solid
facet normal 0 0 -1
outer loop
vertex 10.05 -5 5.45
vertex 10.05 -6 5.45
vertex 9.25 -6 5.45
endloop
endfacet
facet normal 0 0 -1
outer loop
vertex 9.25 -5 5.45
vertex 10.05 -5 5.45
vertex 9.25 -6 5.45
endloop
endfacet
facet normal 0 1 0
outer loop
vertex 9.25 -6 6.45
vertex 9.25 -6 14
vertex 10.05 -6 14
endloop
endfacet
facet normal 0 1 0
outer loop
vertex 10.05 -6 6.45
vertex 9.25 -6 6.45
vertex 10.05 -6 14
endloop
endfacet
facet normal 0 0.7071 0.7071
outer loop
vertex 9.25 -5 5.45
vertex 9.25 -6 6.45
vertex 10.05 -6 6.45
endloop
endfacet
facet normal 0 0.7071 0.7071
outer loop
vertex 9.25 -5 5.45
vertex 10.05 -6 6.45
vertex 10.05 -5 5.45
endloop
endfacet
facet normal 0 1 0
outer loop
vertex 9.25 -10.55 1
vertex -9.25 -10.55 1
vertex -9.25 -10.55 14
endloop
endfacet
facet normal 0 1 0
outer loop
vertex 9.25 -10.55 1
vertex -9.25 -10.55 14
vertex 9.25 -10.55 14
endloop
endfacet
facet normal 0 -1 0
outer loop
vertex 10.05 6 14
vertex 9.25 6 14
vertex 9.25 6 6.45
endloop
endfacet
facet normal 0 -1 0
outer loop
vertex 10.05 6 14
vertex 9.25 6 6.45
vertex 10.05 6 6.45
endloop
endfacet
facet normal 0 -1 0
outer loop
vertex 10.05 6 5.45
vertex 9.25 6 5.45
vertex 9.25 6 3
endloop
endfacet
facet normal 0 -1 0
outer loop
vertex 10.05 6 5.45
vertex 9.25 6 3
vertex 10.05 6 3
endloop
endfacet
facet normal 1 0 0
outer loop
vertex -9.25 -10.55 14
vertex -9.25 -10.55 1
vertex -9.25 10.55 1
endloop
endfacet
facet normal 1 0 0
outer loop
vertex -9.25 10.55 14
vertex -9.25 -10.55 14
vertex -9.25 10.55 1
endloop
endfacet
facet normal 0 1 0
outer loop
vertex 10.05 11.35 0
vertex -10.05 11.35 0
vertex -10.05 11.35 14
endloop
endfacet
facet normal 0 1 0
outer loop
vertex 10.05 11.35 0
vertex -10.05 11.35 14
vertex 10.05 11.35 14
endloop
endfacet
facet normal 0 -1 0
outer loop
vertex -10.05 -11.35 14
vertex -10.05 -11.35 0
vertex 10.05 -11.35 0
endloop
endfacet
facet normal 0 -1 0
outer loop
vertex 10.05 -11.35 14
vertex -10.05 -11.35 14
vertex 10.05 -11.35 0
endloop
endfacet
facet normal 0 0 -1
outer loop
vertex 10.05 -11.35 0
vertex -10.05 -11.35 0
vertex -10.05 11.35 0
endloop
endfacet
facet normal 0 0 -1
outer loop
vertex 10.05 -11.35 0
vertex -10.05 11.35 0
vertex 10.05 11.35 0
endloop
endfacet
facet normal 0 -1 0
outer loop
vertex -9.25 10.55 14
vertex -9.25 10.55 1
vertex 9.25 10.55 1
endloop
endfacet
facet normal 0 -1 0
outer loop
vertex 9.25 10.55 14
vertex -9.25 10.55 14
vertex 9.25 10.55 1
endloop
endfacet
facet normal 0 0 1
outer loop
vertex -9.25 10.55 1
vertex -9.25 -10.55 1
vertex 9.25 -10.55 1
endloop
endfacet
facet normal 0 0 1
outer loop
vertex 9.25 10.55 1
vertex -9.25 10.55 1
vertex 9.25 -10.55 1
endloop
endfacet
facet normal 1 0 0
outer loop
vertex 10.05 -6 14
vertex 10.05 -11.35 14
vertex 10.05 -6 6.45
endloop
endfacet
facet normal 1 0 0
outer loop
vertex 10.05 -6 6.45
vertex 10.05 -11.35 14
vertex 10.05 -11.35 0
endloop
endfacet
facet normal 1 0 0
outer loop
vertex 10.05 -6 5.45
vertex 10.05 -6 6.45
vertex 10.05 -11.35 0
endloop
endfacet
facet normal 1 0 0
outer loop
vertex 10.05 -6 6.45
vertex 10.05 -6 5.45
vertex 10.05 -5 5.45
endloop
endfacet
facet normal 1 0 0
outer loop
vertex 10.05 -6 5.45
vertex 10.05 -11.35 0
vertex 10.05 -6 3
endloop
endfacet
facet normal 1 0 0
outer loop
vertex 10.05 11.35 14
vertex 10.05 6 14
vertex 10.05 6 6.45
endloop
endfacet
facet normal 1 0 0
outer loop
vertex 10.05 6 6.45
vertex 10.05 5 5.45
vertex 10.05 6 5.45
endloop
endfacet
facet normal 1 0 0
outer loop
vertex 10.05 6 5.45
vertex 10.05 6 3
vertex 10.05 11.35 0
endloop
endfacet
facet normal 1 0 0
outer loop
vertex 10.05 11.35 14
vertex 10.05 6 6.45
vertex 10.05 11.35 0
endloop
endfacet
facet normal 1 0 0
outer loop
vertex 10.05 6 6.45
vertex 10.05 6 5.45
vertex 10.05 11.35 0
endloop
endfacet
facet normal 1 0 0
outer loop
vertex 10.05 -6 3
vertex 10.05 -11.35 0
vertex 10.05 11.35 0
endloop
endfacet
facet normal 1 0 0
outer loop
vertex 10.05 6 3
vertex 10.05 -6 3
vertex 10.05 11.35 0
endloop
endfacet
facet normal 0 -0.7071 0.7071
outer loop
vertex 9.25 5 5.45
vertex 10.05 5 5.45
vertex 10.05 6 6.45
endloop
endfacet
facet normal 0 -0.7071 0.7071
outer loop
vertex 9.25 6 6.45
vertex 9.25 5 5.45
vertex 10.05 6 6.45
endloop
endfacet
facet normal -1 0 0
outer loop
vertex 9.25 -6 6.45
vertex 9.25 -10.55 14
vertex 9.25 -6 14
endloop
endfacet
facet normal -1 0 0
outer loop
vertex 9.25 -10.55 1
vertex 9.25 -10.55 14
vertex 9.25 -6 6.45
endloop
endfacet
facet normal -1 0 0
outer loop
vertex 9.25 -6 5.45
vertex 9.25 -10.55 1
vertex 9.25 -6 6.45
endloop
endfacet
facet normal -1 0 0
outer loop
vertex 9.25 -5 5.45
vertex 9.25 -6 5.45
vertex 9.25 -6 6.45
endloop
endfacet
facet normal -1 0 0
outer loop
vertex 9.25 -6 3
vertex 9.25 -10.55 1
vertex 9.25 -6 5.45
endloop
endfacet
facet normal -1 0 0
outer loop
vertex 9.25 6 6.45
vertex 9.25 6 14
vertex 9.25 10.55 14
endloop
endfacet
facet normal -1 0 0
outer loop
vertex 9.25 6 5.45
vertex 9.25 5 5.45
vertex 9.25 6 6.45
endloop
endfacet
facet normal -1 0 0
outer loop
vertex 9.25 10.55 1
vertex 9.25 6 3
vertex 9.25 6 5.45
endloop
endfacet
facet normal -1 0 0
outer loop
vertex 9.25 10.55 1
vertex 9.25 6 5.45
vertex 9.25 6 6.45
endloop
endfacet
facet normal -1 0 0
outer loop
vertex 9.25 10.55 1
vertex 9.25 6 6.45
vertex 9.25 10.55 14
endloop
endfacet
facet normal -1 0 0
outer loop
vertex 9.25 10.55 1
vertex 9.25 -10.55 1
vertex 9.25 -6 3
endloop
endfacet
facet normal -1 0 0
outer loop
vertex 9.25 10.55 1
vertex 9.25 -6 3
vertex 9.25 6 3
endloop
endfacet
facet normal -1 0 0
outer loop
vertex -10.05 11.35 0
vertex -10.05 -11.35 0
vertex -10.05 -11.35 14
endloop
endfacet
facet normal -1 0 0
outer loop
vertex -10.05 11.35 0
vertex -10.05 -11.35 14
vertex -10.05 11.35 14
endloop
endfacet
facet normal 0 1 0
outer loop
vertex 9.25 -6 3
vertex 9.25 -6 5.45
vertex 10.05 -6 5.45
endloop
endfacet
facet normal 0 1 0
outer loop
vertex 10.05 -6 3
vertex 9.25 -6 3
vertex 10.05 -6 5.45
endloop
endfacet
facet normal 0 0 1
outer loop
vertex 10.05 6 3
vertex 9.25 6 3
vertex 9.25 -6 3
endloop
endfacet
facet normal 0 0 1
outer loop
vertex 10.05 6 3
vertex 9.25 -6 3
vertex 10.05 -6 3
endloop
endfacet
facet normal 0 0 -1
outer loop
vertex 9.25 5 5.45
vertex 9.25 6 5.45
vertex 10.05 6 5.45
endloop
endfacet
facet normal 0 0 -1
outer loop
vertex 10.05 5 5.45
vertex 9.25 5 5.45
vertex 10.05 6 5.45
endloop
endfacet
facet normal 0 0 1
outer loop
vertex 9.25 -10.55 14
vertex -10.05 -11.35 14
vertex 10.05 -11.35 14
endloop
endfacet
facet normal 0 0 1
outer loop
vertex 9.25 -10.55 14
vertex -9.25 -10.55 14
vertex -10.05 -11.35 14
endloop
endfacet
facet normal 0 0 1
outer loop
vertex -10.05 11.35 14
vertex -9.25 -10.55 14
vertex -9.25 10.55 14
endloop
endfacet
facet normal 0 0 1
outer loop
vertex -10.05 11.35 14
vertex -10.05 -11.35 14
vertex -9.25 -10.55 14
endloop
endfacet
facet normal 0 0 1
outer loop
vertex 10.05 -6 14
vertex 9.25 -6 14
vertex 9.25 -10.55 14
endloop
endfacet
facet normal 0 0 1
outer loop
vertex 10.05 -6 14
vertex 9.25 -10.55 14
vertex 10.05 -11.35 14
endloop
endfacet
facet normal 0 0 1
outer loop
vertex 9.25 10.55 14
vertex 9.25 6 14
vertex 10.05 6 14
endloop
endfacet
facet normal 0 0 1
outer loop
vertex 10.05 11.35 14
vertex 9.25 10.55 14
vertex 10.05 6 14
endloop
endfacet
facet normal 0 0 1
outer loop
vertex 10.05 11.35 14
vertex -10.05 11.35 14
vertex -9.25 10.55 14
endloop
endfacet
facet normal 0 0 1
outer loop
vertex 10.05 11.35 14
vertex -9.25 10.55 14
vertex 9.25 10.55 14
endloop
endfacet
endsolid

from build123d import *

# Parameters (mm, degrees)
F0_W        = 20.1
F0_H        = 22.7
F0_W_2      = 18.5
F0_H_2      = 21.1
F1_DEPTH    = 14
F2_DEPTH    = 1
F3_W        = 0.8
F3_H        = 12
F4_DEPTH    = 11
F5_W        = 0.8
F5_H        = 2
F6_DEPTH    = 1
F7_W        = 0.8
F7_H        = 2
F8_DEPTH    = 1
F9_T4_DEPTH = 11.0867319519
F9_T9_DEPTH = 11.0867319519


# Not quite as in the source:
# - a fillet or chamfer that OpenCascade refuses, or shapes differently, is made with other operations: its cross-section is extruded or revolved along the edge and cut away or added


with BuildPart() as f1:
    # F0 (on Top) → F1 (new body)
    with BuildSketch(Plane.XY):
        Rectangle(F0_W, F0_H)
        Rectangle(F0_W_2, F0_H_2, mode=Mode.SUBTRACT)
    extrude(amount=F1_DEPTH)

    # F0 (on Top) → F2 (join)
    with BuildSketch(Plane.XY):
        Rectangle(F0_W_2, F0_H_2)
    extrude(amount=F2_DEPTH)

    # F3 (on face) → F4 (cut)
    with BuildSketch(Plane.XY.offset(14)):
        with Locations((9.65, 0)):
            Rectangle(F3_W, F3_H)
    extrude(amount=-F4_DEPTH, mode=Mode.SUBTRACT)

    # F5 (on face) → F6 (join)
    with BuildSketch(Plane.XZ.offset(-6)):
        with Locations((9.65, 6.45)):
            Rectangle(F5_W, F5_H)
    extrude(amount=F6_DEPTH)

    # F7 (on face) → F8 (join)
    with BuildSketch(Plane(origin=(0, -6, 0), x_dir=(-1, 0, 0), z_dir=(0, 1, 0))):
        with Locations((-9.65, 6.45)):
            Rectangle(F7_W, F7_H)
    extrude(amount=F8_DEPTH)

    # F9: chamfer of 2 on 2 edges, made by hand


with BuildPart() as f9_tool2:
    # F9_s3 → F9_t4 (new body)
    with BuildSketch(Plane.YZ.offset(15.1933659759)):
        Polygon((5, 5.45), (7, 7.45), (5, 7.45), align=None)
    extrude(amount=-F9_T4_DEPTH)

    split(bisect_by=Plane.XZ.offset(-6), keep=Keep.TOP)


with BuildPart() as f1_1:
    add(f1.part)

    # F9_t1: cut F9_tool2
    add(f9_tool2.part, mode=Mode.SUBTRACT)


with BuildPart() as f9_tool7:
    # F9_s8 → F9_t9 (new body)
    with BuildSketch(Plane.YZ.offset(4.1066340241)):
        Polygon((-7, 7.45), (-5, 5.45), (-5, 7.45), align=None)
    extrude(amount=F9_T9_DEPTH)

    split(bisect_by=Plane.XZ.offset(6), keep=Keep.BOTTOM)


with BuildPart() as f1_2:
    add(f1_1.part)

    # F9_t6: cut F9_tool7
    add(f9_tool7.part, mode=Mode.SUBTRACT)


solid = f1_2.part
